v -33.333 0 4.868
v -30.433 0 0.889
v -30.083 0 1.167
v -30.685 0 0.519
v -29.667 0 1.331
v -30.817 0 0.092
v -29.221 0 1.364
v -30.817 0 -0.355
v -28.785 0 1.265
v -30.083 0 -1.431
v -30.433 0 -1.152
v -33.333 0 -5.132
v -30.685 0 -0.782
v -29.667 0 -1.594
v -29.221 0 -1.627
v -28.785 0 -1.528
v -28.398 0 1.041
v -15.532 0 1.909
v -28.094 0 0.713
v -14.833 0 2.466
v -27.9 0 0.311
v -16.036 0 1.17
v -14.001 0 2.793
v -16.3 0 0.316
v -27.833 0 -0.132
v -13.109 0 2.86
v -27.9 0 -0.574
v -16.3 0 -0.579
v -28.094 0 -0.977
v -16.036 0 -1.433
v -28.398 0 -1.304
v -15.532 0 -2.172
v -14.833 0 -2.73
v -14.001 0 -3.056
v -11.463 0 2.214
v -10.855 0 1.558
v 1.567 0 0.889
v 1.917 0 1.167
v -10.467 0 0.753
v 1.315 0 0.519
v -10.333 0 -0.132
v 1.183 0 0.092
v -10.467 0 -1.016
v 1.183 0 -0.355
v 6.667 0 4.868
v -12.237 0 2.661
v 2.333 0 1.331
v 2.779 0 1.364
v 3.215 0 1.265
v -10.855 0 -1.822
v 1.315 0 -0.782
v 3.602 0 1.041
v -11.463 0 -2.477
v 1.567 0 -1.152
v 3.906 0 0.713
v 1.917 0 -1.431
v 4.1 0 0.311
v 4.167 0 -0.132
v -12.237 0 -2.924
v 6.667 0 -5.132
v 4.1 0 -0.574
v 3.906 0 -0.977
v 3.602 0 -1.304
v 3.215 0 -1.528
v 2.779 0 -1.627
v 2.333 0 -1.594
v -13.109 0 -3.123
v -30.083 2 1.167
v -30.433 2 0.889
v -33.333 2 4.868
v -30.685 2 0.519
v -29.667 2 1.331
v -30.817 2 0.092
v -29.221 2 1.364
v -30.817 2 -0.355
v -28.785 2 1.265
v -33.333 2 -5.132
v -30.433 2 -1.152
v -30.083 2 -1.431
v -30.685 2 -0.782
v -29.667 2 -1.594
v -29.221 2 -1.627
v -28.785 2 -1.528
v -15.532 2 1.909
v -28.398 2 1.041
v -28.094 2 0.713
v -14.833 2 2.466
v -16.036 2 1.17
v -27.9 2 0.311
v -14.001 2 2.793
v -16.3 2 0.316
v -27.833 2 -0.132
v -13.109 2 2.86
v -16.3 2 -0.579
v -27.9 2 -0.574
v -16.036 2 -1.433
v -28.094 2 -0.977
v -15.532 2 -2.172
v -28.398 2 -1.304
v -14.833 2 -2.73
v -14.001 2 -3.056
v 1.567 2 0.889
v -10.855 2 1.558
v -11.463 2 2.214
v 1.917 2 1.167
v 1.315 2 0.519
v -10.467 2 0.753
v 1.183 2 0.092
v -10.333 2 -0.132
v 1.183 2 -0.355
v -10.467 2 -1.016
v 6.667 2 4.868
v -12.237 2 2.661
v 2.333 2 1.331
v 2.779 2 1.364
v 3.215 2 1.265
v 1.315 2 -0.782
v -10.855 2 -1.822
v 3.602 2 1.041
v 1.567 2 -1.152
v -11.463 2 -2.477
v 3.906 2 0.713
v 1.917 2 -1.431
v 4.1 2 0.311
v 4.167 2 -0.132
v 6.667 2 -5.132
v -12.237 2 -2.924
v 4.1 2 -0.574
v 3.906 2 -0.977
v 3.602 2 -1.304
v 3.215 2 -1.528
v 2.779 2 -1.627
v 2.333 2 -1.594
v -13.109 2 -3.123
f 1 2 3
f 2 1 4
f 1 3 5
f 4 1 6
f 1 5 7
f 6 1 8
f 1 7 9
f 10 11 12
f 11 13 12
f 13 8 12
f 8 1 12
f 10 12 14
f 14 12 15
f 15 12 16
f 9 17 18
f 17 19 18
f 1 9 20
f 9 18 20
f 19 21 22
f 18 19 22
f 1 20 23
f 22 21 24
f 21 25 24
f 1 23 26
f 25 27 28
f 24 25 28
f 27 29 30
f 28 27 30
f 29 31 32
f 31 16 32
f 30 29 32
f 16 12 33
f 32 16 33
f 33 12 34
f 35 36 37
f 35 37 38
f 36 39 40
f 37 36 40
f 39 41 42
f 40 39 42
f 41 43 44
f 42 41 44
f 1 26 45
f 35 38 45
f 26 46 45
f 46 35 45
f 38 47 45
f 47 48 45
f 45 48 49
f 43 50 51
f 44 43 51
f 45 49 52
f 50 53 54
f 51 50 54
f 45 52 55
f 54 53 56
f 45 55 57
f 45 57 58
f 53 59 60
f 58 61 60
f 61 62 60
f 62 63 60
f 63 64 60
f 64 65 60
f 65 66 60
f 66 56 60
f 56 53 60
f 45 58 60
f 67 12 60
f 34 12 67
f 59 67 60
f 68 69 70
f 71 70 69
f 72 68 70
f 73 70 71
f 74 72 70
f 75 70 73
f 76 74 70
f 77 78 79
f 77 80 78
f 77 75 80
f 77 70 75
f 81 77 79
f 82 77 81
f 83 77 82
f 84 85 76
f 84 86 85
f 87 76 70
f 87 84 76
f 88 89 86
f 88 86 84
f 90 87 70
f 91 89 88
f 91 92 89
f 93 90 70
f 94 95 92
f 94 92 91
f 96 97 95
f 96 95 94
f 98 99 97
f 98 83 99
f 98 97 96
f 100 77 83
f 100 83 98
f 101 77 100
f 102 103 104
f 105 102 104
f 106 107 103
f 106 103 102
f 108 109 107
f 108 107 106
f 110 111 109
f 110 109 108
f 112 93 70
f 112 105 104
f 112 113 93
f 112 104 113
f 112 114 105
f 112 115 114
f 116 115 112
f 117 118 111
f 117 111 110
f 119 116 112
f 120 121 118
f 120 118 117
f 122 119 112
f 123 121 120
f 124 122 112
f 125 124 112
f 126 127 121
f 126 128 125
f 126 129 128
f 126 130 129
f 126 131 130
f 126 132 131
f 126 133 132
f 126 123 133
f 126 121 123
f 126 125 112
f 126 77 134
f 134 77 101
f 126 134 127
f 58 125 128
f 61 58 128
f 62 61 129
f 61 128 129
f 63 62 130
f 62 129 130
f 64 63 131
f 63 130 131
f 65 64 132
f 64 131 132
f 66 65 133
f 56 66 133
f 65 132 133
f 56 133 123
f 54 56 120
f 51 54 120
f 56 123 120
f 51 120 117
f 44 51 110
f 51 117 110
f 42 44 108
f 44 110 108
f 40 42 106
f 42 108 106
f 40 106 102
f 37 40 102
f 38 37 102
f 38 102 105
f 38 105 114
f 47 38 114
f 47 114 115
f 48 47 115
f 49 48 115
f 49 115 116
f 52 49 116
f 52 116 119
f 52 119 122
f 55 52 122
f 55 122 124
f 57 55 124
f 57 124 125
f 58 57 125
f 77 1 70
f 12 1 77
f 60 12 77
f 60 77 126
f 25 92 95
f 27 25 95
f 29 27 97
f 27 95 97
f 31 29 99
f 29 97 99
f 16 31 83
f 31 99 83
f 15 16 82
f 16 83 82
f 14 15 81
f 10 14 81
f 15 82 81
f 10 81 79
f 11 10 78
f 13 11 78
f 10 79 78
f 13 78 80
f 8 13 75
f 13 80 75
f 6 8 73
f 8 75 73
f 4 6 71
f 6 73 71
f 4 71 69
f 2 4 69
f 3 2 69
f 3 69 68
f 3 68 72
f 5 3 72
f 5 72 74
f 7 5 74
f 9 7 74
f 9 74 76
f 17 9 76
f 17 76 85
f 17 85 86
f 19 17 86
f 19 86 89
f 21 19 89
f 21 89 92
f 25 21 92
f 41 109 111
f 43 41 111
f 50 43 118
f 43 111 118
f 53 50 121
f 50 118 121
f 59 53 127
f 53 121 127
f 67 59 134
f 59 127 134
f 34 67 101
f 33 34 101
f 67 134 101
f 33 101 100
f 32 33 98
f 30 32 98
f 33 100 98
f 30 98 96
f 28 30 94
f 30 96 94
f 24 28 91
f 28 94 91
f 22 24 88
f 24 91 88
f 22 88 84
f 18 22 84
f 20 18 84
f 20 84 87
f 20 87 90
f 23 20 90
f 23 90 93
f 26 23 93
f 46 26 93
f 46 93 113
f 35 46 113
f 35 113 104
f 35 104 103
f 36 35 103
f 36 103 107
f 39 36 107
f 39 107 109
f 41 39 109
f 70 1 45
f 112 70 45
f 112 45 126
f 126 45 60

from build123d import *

# Parameters (mm, degrees)
SKETCH1_W           = 40
SKETCH1_H           = 10
BOSS_EXTRUDE1_DEPTH = 2
SKETCH2_R           = 1.5
SKETCH2_R_2         = 3
CUT_EXTRUDE1_DEPTH  = 3


with BuildPart() as part:
    # Sketch1 → Boss-Extrude1 (new body)
    with BuildSketch(Plane(origin=(0, 0, 0), x_dir=(1, 0, 0), z_dir=(0, 1, 0))):
        with Locations((-13.333333333, 0.131578947)):
            Rectangle(SKETCH1_W, SKETCH1_H)
    extrude(amount=BOSS_EXTRUDE1_DEPTH)

    # Sketch2 → Cut-Extrude1 (cut, through all)
    with BuildSketch(Plane(origin=(0, 2, 0), x_dir=(1, 0, 0), z_dir=(0, 1, 0))):
        with Locations((-29.333333333, 0.131578947)):
            Circle(SKETCH2_R)
        with Locations((2.666666667, 0.131578947)):
            Circle(SKETCH2_R)
        with Locations((-13.333333333, 0.131578947)):
            Circle(SKETCH2_R_2)
    extrude(amount=-CUT_EXTRUDE1_DEPTH, mode=Mode.SUBTRACT)


solid = part.part
